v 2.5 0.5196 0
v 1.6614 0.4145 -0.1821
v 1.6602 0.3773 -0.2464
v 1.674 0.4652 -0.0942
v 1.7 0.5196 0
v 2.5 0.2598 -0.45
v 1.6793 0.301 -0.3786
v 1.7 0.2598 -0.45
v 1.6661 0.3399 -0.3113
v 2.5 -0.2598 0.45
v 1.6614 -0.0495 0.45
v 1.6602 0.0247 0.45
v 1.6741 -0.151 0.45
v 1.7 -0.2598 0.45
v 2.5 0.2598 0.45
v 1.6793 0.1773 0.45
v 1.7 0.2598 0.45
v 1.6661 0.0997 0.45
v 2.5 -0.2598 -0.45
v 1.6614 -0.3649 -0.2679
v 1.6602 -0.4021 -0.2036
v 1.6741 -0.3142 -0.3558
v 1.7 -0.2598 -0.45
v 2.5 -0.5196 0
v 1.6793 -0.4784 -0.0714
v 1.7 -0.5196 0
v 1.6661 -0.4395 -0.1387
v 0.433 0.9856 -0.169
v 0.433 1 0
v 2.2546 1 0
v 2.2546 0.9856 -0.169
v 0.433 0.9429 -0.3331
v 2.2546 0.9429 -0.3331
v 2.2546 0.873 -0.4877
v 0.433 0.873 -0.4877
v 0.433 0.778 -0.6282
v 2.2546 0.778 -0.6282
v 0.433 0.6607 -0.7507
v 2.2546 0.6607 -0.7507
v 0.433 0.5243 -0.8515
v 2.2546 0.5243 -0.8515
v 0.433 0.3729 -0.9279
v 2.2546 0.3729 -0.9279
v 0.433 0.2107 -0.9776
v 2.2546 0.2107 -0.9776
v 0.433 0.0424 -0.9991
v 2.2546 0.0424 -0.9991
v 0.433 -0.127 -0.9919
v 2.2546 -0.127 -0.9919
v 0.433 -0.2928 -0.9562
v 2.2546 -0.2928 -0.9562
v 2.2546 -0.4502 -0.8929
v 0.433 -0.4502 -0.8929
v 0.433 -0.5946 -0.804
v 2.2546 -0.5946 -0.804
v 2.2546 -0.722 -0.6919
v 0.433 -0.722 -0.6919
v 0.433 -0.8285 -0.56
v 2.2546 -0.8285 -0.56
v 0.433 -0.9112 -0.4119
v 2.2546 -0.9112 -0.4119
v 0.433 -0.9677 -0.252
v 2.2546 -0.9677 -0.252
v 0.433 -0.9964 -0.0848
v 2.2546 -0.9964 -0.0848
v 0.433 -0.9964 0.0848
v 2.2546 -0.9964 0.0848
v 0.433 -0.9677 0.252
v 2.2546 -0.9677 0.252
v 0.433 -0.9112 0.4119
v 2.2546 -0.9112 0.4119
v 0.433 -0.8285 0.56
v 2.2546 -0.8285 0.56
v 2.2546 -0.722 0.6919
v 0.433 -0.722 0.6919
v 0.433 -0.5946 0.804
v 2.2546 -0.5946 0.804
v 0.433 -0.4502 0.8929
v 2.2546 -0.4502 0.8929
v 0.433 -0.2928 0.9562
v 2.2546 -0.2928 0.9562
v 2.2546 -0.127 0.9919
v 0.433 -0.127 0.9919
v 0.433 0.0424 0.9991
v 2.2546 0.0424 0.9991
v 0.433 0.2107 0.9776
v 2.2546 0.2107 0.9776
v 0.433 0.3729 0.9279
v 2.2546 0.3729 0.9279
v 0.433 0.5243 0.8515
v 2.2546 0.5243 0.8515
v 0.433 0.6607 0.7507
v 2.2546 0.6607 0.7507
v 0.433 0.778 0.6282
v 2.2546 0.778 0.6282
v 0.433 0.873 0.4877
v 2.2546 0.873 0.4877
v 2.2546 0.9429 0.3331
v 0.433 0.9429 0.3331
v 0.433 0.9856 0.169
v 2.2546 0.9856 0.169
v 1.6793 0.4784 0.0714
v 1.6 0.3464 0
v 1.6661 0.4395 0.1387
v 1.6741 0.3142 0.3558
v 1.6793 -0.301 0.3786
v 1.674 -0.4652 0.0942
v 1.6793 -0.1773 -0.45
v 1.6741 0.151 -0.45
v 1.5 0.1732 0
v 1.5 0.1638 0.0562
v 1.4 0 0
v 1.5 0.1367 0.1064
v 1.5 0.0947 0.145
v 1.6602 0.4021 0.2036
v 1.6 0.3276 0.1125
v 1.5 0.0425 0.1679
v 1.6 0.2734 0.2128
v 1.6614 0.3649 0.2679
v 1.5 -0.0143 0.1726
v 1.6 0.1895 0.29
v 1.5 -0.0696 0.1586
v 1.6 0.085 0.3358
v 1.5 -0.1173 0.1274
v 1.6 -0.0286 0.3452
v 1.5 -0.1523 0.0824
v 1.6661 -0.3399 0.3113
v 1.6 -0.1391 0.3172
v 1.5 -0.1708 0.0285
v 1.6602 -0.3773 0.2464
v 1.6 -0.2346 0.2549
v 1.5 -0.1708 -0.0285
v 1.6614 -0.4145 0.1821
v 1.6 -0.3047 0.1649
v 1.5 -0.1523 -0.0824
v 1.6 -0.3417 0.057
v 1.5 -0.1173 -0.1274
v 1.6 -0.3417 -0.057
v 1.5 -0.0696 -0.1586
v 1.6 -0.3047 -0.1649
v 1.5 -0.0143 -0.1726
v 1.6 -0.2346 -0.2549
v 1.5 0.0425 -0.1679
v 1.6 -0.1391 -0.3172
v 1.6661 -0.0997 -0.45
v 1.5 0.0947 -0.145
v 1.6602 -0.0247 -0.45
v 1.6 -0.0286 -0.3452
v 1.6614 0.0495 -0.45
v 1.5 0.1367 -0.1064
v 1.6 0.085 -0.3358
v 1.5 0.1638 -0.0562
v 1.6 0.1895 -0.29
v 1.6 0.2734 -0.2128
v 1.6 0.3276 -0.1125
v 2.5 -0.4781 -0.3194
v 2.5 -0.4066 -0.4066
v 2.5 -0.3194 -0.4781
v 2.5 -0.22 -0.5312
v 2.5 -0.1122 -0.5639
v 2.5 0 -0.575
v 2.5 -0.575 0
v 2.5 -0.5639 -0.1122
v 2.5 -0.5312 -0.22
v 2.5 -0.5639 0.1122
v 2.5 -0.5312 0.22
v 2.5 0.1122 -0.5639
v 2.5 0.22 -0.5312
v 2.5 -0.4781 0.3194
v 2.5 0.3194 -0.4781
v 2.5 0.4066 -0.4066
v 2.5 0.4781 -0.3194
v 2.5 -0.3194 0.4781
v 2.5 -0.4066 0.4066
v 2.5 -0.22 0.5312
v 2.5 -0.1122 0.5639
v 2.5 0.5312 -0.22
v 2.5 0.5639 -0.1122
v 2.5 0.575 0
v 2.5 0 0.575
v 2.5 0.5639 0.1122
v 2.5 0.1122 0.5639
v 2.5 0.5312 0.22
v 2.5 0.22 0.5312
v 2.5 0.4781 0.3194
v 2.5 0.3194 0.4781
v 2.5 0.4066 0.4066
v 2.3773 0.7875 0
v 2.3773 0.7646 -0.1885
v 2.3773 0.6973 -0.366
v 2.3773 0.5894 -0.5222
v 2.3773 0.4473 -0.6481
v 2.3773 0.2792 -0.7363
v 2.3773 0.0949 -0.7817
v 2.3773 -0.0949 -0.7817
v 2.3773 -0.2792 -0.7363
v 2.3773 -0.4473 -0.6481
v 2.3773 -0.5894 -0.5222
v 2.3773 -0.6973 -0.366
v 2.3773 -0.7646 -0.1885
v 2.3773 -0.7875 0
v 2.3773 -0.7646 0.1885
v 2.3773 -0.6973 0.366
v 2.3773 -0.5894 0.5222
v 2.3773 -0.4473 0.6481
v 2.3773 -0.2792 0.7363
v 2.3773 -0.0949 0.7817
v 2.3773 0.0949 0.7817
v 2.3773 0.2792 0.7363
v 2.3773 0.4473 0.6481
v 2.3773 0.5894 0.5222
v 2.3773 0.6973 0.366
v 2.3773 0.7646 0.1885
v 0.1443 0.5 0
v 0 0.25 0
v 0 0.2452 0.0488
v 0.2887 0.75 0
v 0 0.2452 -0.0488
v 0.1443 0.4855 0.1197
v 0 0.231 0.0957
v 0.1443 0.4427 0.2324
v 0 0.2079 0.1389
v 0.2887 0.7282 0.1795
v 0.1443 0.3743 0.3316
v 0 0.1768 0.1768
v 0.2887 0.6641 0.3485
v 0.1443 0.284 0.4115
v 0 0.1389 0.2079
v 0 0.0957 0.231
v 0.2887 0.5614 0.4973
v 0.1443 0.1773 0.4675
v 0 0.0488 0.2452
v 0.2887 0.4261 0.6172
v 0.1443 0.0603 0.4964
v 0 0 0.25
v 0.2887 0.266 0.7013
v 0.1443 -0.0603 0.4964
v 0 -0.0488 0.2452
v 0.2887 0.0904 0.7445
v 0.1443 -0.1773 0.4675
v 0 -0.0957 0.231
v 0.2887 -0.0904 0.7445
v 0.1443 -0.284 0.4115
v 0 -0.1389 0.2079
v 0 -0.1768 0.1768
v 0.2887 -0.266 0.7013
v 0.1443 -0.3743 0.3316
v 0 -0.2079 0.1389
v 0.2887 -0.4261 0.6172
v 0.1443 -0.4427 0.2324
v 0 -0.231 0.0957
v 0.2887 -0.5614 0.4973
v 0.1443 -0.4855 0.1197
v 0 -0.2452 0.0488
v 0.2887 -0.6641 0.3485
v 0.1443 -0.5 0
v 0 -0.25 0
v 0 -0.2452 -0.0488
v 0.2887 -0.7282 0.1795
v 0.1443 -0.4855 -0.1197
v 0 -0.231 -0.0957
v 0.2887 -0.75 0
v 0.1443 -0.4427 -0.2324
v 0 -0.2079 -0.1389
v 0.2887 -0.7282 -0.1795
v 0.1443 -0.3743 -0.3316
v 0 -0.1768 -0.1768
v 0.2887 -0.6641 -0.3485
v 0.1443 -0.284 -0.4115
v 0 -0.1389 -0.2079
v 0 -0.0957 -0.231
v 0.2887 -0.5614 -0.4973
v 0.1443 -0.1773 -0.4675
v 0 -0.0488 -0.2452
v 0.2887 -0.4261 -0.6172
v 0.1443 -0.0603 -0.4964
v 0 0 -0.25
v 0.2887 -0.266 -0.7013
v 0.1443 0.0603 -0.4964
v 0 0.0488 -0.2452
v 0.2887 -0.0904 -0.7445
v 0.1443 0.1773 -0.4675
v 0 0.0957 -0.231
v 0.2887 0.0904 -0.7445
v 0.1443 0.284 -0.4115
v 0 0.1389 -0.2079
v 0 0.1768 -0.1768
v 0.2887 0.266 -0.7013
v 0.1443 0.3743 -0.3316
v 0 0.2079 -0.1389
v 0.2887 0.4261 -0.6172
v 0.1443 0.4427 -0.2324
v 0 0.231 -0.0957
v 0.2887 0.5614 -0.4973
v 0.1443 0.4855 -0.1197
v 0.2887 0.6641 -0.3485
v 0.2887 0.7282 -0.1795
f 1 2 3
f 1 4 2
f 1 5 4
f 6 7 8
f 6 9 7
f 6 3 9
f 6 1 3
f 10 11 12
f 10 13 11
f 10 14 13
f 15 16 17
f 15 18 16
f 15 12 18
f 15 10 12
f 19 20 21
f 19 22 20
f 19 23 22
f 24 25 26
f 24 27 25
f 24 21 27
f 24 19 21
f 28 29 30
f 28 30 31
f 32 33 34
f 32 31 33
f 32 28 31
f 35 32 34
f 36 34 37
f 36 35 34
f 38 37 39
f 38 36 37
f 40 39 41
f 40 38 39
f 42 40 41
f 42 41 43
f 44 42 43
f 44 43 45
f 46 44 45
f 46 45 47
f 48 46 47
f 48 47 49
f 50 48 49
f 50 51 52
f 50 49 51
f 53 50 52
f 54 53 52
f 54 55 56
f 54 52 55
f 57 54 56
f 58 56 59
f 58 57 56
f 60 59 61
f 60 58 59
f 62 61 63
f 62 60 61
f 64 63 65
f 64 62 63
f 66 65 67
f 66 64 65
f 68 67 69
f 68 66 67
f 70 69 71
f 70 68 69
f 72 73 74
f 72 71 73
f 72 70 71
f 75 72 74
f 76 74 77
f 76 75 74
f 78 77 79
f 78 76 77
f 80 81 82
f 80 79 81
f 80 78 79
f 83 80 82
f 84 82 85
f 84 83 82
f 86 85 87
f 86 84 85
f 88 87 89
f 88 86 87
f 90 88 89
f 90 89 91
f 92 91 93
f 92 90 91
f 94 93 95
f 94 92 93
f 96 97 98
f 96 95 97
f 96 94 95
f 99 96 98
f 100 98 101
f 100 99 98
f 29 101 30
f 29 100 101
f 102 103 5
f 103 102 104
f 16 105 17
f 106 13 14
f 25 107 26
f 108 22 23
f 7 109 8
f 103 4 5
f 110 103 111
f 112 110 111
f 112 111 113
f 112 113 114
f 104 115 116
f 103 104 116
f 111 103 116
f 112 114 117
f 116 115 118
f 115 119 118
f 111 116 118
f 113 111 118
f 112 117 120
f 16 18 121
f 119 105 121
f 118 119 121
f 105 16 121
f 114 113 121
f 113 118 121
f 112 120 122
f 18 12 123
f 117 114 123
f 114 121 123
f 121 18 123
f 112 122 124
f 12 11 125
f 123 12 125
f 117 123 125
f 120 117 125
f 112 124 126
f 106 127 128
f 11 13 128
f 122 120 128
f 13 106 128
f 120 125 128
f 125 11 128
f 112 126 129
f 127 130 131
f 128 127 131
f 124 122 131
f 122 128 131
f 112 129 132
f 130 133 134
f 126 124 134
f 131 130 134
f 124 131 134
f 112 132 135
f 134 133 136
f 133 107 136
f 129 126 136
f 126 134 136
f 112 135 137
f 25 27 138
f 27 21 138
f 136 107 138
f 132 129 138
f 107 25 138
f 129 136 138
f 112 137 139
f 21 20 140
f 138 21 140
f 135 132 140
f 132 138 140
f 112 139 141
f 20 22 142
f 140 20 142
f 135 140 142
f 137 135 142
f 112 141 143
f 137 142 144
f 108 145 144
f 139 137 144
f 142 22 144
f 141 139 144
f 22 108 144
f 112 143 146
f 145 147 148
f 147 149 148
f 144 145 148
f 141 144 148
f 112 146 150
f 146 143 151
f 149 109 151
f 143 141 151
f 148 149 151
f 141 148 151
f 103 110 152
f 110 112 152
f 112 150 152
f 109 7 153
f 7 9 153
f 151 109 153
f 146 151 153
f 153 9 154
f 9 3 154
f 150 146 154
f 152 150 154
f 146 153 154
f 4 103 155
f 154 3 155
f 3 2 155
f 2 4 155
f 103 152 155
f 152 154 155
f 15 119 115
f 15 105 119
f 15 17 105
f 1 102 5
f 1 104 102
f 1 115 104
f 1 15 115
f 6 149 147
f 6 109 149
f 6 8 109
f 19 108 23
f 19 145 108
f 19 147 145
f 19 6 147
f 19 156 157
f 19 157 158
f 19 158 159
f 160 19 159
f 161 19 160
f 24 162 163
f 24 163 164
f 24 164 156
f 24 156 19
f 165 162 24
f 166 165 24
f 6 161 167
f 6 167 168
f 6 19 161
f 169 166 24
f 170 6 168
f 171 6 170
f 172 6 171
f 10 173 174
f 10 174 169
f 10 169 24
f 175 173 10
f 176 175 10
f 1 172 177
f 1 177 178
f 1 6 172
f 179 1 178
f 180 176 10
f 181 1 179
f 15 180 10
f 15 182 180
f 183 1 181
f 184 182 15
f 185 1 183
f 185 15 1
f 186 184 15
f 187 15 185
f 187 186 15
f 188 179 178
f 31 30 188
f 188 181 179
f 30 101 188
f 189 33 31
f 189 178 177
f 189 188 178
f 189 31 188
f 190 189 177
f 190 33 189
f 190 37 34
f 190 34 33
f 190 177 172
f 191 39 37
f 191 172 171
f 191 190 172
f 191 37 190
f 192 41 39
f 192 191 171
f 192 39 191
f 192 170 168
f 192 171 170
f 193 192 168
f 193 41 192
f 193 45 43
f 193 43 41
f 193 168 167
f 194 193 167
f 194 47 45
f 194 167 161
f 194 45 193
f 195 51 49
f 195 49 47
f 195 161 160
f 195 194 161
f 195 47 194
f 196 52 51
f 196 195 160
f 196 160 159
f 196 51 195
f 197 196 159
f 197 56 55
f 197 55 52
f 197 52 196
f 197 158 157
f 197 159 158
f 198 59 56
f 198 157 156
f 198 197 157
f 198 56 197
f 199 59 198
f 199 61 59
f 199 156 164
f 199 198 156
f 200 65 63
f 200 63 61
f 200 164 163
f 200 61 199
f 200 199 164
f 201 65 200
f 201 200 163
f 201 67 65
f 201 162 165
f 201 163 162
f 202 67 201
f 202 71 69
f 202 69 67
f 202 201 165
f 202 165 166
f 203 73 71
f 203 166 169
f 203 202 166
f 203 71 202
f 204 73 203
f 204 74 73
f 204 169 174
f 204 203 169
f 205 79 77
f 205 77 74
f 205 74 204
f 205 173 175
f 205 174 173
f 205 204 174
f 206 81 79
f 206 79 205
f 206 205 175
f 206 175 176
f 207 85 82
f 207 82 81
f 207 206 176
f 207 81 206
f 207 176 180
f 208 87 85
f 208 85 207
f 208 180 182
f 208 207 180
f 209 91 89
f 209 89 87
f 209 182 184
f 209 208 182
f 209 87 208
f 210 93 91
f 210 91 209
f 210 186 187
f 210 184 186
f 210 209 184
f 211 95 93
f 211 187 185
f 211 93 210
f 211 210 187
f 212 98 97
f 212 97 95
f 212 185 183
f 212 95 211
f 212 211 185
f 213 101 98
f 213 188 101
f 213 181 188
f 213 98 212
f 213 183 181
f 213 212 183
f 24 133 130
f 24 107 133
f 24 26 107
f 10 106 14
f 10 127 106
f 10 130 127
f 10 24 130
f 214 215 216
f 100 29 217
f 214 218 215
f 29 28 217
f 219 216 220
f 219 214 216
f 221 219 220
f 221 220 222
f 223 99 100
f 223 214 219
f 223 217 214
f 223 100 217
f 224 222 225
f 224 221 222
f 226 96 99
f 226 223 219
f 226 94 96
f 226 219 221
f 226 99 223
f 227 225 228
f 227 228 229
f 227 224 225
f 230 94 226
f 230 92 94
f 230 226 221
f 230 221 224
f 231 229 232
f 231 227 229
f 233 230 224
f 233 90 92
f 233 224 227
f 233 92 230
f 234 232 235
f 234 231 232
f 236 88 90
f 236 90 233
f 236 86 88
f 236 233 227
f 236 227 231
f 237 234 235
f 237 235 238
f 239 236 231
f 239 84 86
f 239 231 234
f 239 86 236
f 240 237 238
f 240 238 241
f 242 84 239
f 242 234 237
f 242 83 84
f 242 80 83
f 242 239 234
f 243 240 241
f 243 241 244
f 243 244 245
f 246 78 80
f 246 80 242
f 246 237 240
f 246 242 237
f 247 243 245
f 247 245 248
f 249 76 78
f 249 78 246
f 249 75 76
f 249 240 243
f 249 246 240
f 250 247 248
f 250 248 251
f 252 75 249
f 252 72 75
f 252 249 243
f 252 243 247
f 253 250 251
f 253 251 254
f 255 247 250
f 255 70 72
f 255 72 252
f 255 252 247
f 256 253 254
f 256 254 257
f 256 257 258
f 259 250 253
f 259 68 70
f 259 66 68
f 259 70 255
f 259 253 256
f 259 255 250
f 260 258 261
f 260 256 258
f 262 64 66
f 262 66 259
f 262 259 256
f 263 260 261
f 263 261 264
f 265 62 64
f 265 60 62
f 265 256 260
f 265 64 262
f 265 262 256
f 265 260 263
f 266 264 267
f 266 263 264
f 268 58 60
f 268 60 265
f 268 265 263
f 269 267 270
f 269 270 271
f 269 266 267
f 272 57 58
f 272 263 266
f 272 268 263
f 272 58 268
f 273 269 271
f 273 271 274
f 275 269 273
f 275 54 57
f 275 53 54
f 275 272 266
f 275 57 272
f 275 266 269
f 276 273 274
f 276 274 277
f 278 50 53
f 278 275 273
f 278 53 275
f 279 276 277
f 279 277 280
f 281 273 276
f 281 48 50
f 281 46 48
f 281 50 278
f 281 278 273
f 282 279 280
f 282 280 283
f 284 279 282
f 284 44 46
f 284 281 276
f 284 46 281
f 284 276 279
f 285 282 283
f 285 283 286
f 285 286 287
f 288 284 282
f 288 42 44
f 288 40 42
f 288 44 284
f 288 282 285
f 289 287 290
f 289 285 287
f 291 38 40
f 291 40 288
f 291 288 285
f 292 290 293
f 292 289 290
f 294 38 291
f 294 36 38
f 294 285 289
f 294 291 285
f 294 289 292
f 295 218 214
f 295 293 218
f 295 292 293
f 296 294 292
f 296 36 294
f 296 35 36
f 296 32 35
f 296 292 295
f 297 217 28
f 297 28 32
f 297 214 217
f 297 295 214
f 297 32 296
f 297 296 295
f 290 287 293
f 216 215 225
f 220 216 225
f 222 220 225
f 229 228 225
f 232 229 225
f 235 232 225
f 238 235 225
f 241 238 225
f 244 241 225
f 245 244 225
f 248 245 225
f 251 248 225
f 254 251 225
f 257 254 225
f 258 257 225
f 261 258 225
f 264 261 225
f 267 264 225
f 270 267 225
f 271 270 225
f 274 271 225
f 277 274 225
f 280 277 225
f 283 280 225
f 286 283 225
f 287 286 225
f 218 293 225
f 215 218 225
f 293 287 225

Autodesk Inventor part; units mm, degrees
ref_plane "YZ Plane" through (0, 0, 0) normal (1, 0, 0) x (0, 1, 0)
ref_plane "XZ Plane" through (0, 0, 0) normal (0, 1, 0) x (-1, 0, 0)
sketch "Skizze1" plane through (0, 0, 0) normal (0, 0, 1) x (1, 0, 0)
  line L0 (0, 0) -> (1.4, 0)
  line L1 (2.5, 0.5196) -> (2.5, 1)
  line L2 (2.5, 1) -> (0, 1)
  line L3 (2.5, 0.5196) -> (1.7, 0.5196)
  line L4 (1.7, 0.5196) -> (1.4, 0)
  line L5 (0, -0.2) -> (0, 1.2) projected
  line L6 (0, 1) -> (0, 0)
  dimension "d0" = 0.8
  dimension "d1" = 60
  dimension "d2" = 2
  dimension "d3" = 1.0392
  dimension "d5" = 2.5
revolve "Körper" add sketch "Skizze1" angle 360 about axis through (0, 0, 0) along (1, 0, 0)
sketch "Skizze2" plane through (2.5, 0, 0) normal (1, 0, 0) x (0, 1, 0)
  circle A0 centre (0, 0) radius 0.5196 projected
  line L0 (-0.2598, 0.45) -> (0.2598, 0.45)
  line L1 (0.2598, 0.45) -> (0.5196, 0)
  line L2 (0.5196, 0) -> (0.2598, -0.45)
  line L3 (0.2598, -0.45) -> (-0.2598, -0.45)
  line L4 (-0.2598, -0.45) -> (-0.5196, 0)
  line L5 (-0.5196, 0) -> (-0.2598, 0.45)
  point P0 (0, 0)
  point P1 (0, 0)
extrude "Loch" add sketch "Skizze2" against normal up to next contours L1 A0 | A0 L2 | L0 A0 | A0 L3 | L5 A0 | A0 L4
thread "Gewinde" size "M2x0.4" class "6g" standard "ISO Metric profile" length 2.5
chamfer "Fase1" distance 0.433 angle 60 1 edges at (0, -1, 0) measured on face at (1.6667, 0.9968, -0.0805)
chamfer "Fase2" distance 0.2454 angle 60 1 edges at (2.5, -1, 0) measured on face at (1.811, 0.9871, -0.1604)
ref_plane "Work Plane1" through (1.25, 0, 0) normal (0, 0, 1) x (1, 0, 0)
equation "\"d0\" = INTI"
equation "\"d2\" = NND"
equation "\"d3\" = 1.1547 * SW"
equation "\"d5\" = NLG"
equation "\"d12\" = NLG"
equation "\"d9\" = FAWI"
equation "\"d10\" = -0.5 * GD1 + 0.5 * NND"
equation "\"d11\" = FAWI"
equation "\"d35\" = -0.5 * GD1 + 0.5 * NND"
equation "\"NND\" = 2"
equation "\"NLG\" = 2.5"
equation "\"INTI\" = 0.8"
equation "\"FAWI\" = 60deg"
equation "\"SW\" = 0.9"
equation "\"GD1\" = THREADDIA - 1.2269 * PTC"
equation "\"FAWI1\" = 45deg"
equation "\"SPD\" = 0.5"
equation "\"GUL\" = 0.61345 * PTC"
equation "\"TOA\" = 30deg"
equation "\"THREADDIA\" = 2"
equation "\"PTC\" = 0.4"
equation "\"GAL\" = 0.61345 * PTC"
equation "\"E0\" = 1.155 * SW"
properties part number "ISO 4027 - M2 x 2,5" material "Edelstahl, 440C"
